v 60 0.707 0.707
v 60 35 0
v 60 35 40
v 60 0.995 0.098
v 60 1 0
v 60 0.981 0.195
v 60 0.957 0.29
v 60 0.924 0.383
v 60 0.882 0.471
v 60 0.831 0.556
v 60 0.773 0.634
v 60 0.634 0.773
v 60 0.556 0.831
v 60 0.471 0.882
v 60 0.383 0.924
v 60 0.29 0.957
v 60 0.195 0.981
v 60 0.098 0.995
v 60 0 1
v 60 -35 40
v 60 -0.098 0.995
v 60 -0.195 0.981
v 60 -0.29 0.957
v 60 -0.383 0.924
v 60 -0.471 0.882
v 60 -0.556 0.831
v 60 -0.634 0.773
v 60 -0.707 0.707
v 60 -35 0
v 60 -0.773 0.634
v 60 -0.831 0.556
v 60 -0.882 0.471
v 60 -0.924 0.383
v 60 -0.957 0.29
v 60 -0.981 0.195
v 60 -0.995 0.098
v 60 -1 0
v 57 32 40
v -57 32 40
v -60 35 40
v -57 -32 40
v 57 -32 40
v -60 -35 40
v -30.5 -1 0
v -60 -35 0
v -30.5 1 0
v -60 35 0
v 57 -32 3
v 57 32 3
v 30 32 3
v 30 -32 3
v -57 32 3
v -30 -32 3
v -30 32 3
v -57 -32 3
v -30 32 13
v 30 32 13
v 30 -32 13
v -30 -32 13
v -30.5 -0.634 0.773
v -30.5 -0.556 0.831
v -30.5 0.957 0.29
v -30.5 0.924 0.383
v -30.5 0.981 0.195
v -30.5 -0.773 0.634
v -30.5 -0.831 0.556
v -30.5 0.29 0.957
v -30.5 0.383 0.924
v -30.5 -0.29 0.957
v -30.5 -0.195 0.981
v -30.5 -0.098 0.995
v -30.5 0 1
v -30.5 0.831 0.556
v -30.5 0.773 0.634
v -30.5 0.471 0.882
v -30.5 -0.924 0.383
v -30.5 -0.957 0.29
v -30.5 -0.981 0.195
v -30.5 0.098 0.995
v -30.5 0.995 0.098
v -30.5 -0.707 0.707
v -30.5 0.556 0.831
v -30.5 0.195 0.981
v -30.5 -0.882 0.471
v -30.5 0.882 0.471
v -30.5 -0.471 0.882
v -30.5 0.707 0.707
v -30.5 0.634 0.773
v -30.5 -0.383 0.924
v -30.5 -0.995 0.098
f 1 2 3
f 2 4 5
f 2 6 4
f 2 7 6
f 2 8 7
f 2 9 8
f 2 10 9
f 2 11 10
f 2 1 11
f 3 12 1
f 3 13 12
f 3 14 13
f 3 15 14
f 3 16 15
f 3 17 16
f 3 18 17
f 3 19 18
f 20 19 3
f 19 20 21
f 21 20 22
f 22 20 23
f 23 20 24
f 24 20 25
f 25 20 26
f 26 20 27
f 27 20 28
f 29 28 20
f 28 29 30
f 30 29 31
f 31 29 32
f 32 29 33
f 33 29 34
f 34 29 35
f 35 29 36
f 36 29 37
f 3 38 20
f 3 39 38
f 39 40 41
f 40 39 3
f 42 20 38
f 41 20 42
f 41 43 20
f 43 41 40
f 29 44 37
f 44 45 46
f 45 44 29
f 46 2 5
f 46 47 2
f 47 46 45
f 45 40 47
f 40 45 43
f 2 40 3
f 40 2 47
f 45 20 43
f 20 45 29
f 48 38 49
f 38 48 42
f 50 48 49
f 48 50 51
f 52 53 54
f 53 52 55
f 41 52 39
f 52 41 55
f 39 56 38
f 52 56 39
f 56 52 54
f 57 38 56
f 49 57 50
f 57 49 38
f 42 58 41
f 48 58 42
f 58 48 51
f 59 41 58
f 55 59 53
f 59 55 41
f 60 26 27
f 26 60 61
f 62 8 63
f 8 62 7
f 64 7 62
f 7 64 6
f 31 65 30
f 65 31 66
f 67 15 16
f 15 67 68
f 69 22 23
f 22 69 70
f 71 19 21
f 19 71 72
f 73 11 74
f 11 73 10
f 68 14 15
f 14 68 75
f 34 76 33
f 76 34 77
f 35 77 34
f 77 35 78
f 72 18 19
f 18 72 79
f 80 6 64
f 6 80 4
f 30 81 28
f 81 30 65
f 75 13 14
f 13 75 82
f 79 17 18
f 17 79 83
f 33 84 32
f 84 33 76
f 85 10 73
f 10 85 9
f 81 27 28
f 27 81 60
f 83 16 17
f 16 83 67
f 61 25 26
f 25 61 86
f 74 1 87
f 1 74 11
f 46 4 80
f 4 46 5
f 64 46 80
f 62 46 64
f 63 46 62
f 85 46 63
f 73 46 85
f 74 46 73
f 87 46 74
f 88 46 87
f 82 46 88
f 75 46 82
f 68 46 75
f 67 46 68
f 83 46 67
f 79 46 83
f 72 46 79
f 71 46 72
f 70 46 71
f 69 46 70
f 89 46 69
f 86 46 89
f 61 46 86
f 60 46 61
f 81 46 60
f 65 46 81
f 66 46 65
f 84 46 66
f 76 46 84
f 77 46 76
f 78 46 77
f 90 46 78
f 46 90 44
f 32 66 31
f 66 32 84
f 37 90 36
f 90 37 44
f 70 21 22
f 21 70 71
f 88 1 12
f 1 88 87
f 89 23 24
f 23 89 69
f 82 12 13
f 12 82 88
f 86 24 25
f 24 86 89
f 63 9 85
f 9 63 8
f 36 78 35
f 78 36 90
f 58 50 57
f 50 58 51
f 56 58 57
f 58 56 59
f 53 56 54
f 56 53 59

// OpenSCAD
// Parameters (mm)
outer_x   = 120;   // outer length (X)
outer_y   = 70;    // outer width  (Y)
outer_z   = 40;    // outer height (Z)
wall_thk  = 3;    // wall thickness
floor_thk = 3;    // floor thickness

inner_x   = outer_x - 2*wall_thk;          // inner cavity length
inner_y   = outer_y - 2*wall_thk;          // inner cavity width
inner_z   = outer_z - floor_thk;           // inner cavity height (from floor to top)

platform_len = 60;   // platform length (X) inside tank
platform_h   = 10;   // platform height above floor
platform_center_z = floor_thk + platform_h/2; // Z of platform centre

hole_d   = 2;        // electrode hole diameter
hole_r   = hole_d/2;
hole_y   = 0;        // hole centre Y
hole_z   = 30;       // hole centre Z
cyl_len  = outer_x + 1; // cylinder length (extends >0.5 mm beyond each wall)

// Global resolution for curved shapes
$fn = 64;

// Outer tank (solid) – shifted so that bottom sits on Z = 0
module outer_tank() {
    translate([0, 0, outer_z/2])          // move cube so its bottom is at z=0
        cube([outer_x, outer_y, outer_z], center = true);
}

// Inner cavity (to be removed) – positioned inside the tank
module inner_cavity() {
    translate([0, 0, floor_thk + inner_z/2])   // bottom at floor_thk
        cube([inner_x, inner_y, inner_z], center = true);
}

// Raised platform for the gel tray – sits on the inner floor
module platform() {
    translate([0, 0, platform_center_z])
        cube([platform_len, inner_y, platform_h], center = true);
}

// Horizontal electrode hole through each X‑end wall
module electrode_hole() {
    rotate([0, 90, 0])                     // orient cylinder along X
        translate([0, hole_y, hole_z])      // place centre at (0,0,30)
            cylinder(h = cyl_len, r = hole_r, center = true);
}

// Assemble tank with holes, then add platform
module tank_assembly() {
    difference() {
        outer_tank();
        inner_cavity();
        electrode_hole();                 // subtract hole from tank walls
    }
}

// Final part
union() {
    tank_assembly();
    platform();
}
